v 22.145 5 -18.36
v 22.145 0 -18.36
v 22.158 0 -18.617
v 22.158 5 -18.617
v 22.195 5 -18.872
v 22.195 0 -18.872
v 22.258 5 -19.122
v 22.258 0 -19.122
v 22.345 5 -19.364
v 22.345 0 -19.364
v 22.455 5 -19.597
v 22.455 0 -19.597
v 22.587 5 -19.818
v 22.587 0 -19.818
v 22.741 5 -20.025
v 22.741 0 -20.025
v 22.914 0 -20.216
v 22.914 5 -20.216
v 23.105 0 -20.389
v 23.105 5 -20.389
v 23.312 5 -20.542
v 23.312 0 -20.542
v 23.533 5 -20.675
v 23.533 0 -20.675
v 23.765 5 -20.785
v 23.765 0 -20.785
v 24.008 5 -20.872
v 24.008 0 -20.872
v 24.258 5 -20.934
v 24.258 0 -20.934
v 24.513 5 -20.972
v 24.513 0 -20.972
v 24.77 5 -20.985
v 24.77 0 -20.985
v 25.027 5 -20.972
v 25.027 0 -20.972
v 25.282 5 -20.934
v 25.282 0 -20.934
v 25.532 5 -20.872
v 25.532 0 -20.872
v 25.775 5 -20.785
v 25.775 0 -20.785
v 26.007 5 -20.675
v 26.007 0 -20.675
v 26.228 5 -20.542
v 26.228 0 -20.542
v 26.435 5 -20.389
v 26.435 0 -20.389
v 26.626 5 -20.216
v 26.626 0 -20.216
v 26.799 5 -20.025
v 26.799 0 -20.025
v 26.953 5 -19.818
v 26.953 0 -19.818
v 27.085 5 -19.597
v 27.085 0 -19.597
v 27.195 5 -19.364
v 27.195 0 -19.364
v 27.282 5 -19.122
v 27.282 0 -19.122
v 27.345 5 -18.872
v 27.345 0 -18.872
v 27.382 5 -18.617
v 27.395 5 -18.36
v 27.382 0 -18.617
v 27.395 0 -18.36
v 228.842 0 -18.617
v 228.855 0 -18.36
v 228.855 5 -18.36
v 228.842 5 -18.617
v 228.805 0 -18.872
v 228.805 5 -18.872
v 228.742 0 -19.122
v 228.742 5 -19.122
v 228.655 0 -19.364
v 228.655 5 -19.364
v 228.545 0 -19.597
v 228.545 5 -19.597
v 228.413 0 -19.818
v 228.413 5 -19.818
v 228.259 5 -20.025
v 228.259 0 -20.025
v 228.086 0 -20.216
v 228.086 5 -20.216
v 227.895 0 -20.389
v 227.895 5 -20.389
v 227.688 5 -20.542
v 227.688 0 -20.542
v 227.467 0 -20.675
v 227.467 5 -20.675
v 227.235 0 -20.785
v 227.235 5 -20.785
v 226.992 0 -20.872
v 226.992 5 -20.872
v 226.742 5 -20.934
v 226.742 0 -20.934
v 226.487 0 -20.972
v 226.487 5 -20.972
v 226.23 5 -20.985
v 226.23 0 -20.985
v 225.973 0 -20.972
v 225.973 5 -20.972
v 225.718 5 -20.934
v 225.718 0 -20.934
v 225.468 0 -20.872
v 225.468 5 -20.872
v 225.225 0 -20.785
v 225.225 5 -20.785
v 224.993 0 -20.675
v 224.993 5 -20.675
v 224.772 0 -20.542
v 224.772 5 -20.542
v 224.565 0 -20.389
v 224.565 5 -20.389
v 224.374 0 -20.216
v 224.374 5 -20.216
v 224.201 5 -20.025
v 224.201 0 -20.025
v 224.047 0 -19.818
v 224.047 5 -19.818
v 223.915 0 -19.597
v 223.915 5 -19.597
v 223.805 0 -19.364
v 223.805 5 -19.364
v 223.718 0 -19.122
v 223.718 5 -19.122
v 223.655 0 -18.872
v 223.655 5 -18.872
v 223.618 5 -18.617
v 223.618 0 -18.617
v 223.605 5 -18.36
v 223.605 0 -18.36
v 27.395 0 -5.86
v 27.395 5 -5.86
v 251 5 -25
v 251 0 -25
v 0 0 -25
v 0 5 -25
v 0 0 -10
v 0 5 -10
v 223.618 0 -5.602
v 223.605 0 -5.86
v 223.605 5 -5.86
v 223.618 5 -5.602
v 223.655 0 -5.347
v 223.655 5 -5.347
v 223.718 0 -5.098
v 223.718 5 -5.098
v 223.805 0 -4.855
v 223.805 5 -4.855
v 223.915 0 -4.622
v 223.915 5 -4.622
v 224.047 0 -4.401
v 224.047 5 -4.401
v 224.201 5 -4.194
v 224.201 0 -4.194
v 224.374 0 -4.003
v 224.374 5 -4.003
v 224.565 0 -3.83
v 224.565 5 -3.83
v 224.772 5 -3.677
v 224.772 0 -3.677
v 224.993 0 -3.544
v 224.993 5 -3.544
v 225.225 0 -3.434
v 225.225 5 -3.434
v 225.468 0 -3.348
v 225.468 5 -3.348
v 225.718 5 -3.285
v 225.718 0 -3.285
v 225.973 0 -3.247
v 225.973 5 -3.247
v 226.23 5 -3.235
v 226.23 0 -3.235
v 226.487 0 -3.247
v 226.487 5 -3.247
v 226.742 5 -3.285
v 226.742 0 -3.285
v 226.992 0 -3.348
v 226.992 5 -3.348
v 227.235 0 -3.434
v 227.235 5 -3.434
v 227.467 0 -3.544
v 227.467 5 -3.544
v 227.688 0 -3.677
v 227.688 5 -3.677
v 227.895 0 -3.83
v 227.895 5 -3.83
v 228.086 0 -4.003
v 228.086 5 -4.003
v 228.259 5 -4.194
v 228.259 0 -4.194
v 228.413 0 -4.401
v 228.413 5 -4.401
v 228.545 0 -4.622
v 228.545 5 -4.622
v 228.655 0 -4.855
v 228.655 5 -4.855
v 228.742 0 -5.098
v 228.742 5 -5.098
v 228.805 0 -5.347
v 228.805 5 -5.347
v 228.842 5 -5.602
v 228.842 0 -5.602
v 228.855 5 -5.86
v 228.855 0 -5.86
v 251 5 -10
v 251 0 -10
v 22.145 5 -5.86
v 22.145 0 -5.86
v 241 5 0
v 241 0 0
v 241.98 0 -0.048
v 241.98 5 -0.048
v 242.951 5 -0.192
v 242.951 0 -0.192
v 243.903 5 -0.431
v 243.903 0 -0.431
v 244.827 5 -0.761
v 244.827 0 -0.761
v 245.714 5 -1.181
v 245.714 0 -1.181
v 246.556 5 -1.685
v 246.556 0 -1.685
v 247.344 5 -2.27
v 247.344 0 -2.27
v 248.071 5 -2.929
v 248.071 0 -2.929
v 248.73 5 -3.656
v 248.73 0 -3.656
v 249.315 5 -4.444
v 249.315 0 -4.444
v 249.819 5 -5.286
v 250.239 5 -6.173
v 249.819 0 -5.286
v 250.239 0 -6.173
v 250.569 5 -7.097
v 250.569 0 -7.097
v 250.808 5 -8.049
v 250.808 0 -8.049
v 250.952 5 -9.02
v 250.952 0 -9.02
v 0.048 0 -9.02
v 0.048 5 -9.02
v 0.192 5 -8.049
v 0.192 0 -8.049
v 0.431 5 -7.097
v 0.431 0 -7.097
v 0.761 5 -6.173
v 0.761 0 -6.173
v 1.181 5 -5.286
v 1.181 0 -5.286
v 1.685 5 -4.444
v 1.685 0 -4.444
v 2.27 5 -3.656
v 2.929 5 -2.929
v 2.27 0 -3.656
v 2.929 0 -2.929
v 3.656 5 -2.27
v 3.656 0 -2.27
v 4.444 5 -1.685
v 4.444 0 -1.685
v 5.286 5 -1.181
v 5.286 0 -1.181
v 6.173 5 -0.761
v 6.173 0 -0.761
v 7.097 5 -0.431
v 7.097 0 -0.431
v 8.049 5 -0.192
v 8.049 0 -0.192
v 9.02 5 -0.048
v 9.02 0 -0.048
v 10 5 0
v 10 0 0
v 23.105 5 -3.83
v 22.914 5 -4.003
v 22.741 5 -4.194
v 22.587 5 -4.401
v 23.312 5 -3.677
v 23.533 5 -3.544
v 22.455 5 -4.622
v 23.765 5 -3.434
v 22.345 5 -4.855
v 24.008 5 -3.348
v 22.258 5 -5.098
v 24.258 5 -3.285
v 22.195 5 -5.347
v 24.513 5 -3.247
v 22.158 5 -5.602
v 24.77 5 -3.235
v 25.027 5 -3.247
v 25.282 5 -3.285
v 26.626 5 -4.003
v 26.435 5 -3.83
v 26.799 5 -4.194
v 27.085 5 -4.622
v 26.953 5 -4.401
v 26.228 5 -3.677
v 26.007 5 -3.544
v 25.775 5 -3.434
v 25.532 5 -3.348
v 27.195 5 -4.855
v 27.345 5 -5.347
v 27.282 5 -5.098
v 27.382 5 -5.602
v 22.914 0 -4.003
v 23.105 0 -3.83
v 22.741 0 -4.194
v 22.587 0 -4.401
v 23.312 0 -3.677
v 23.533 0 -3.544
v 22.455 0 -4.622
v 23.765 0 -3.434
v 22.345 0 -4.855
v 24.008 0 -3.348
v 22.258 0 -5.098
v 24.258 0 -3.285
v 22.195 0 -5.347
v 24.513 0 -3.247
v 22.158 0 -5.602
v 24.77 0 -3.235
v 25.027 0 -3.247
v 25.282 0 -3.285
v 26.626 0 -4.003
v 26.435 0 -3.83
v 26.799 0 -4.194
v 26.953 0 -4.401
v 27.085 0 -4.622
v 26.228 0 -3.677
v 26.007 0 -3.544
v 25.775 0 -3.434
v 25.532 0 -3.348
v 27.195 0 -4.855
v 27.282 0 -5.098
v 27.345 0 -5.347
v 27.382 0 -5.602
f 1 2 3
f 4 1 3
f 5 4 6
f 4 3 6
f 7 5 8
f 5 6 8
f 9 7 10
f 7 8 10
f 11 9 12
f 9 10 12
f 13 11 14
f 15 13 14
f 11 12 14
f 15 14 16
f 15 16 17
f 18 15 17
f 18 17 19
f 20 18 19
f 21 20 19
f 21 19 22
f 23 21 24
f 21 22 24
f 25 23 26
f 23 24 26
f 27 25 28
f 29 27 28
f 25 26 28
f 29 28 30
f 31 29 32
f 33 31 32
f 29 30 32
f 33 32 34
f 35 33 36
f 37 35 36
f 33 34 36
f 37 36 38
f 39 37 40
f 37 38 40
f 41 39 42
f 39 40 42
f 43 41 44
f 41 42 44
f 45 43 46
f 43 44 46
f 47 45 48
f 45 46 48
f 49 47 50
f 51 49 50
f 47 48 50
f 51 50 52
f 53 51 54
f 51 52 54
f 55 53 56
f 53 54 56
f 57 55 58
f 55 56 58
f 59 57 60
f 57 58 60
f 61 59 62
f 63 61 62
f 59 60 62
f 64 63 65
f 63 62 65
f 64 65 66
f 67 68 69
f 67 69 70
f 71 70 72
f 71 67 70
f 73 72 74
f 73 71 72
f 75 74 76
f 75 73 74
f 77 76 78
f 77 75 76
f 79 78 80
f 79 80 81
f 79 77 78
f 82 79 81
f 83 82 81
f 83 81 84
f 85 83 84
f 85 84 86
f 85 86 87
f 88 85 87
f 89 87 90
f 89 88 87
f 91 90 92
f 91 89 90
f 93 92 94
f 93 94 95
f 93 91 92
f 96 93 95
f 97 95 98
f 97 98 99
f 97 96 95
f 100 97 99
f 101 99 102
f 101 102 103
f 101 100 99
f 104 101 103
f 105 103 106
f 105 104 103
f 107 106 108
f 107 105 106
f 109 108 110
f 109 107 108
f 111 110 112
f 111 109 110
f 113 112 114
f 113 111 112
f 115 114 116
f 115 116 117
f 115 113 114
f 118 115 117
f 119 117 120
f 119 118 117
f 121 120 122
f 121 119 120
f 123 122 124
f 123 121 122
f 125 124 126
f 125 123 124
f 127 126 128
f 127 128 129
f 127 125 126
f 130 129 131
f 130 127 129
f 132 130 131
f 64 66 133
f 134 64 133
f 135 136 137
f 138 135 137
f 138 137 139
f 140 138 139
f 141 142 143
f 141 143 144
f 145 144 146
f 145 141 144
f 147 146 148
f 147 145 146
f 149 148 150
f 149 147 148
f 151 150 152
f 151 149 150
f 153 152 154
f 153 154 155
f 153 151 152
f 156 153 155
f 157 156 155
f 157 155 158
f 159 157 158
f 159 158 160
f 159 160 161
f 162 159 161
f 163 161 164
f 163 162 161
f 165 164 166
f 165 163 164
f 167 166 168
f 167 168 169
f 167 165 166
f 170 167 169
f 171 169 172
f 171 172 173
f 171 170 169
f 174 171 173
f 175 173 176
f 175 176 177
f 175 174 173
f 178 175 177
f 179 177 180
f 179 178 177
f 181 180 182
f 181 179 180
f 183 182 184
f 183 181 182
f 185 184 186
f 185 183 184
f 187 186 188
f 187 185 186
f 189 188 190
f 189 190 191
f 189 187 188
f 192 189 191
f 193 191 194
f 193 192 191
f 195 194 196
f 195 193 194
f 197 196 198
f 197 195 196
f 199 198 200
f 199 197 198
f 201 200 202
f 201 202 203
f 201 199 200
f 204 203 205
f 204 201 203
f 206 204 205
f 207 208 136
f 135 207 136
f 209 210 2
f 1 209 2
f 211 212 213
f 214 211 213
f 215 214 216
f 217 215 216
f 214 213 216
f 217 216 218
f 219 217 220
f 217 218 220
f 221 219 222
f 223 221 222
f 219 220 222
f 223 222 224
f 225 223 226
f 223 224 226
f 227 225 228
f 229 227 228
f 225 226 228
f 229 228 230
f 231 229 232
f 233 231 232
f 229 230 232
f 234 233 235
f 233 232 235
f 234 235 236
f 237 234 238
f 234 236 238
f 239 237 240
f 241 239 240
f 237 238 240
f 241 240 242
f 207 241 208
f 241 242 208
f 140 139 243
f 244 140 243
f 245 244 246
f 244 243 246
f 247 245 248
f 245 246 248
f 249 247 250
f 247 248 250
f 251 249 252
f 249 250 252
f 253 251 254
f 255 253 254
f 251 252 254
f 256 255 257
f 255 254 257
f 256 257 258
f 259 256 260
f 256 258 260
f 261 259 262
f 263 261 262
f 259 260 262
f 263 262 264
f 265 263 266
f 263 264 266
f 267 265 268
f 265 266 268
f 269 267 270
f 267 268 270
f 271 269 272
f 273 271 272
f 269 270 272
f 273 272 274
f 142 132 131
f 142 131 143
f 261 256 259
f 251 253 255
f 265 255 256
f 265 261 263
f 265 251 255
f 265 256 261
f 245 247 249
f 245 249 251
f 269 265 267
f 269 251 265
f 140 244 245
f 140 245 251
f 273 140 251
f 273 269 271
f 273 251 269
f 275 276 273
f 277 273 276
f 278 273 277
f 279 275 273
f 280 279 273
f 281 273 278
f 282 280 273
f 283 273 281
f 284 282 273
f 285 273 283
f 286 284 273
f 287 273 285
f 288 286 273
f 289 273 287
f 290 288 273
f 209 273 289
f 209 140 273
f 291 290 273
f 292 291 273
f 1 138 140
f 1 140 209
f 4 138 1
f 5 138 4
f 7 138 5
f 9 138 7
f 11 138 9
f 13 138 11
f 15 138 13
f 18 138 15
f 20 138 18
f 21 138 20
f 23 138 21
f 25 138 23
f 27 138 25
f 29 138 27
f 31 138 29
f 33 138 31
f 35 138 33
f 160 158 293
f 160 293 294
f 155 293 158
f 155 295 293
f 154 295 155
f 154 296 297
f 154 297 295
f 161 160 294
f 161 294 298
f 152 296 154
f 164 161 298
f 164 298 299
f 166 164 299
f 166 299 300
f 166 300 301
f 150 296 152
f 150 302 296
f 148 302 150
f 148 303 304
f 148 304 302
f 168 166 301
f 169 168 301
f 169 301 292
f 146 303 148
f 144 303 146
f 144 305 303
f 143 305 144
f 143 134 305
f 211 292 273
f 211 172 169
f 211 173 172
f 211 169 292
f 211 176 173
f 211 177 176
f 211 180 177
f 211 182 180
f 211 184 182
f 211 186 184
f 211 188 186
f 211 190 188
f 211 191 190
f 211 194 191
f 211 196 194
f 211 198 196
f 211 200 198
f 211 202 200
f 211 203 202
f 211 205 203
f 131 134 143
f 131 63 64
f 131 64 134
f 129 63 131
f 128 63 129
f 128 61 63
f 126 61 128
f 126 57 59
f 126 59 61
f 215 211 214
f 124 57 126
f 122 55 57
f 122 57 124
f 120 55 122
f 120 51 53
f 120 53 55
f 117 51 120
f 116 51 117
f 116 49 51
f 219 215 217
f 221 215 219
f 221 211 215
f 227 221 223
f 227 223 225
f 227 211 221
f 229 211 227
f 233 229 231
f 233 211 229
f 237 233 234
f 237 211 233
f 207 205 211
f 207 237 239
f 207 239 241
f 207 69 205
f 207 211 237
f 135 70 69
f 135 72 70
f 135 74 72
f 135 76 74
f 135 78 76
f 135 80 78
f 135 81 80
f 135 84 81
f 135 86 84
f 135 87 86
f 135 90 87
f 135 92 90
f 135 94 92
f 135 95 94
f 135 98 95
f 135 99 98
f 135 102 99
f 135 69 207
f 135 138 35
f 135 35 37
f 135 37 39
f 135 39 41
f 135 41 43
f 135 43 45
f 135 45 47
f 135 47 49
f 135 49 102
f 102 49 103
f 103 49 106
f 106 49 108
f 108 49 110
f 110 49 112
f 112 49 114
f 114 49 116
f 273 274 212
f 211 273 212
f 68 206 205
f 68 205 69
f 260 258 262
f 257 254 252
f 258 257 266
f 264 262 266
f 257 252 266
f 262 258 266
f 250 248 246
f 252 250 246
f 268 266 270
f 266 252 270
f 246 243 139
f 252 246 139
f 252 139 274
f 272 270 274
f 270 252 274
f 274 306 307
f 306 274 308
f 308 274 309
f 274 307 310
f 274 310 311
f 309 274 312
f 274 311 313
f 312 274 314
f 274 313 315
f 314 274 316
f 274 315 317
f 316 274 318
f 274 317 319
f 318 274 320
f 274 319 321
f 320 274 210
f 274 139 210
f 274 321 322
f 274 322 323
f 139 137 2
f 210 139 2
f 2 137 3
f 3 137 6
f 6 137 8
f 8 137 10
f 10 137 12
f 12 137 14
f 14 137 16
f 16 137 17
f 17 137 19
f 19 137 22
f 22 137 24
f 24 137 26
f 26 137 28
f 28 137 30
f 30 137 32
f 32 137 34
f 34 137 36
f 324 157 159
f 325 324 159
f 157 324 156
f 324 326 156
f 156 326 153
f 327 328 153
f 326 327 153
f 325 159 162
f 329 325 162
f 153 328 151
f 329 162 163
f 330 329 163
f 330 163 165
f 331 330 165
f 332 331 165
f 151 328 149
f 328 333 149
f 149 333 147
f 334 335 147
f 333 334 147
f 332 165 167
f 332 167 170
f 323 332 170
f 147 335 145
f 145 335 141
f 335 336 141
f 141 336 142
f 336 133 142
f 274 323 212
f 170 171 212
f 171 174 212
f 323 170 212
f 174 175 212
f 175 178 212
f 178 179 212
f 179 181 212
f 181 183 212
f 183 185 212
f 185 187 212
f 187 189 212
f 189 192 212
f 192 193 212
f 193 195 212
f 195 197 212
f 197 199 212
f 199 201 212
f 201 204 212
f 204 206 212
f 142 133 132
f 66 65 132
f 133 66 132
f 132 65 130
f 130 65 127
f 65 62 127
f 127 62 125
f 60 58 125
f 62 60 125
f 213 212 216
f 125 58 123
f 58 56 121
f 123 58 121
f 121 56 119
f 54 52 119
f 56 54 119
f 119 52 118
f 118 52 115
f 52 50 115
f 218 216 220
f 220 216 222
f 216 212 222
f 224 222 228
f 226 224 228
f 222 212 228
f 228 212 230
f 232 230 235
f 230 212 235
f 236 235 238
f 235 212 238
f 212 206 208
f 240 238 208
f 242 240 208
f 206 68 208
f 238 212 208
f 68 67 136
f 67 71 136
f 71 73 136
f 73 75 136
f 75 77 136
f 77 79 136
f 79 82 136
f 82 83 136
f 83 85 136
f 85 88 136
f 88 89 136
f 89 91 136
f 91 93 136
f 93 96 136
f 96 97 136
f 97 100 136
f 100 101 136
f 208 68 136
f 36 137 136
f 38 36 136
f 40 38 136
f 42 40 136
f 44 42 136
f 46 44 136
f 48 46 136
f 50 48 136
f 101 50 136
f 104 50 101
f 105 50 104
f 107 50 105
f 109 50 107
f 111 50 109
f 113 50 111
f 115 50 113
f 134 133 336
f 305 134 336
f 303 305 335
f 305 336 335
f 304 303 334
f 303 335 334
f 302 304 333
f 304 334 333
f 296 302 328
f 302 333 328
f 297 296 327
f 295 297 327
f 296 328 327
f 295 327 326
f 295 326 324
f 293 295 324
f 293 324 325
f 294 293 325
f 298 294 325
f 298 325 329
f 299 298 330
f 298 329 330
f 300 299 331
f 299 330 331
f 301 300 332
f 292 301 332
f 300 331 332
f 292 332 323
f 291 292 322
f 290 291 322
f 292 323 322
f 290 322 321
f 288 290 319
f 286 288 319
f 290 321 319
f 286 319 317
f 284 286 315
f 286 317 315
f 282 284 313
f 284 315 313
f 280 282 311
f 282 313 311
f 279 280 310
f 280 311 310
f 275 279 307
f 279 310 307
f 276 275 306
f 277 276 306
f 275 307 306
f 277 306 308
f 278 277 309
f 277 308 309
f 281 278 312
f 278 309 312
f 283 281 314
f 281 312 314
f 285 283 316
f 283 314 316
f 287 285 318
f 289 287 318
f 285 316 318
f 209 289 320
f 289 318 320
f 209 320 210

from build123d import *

# Parameters (mm, degrees)
SALIENTE_EXTRUIR1_DEPTH = 5


with BuildPart() as part:
    # Croquis1 → Saliente-Extruir1 (new body)
    with BuildSketch(Plane(origin=(0, 0, 0), x_dir=(1, 0, 0), z_dir=(0, 1, 0))):
        with BuildLine():
            Line((10, 0), (241, 0))
            ThreePointArc((241, 0), (248.071067812, 2.928932188), (251, 10))
            Line((251, 10), (251, 25))
            Line((251, 25), (0, 25))
            Line((0, 25), (0, 10))
            ThreePointArc((0, 10), (2.928932188, 2.928932188), (10, 0))
        make_face()
        with BuildLine():
            Line((27.395, 18.359540636), (27.395, 5.859540636))
            ThreePointArc((27.395, 5.859540636), (24.77, 3.234540636), (22.145, 5.859540636))
            Line((22.145, 5.859540636), (22.145, 18.359540636))
            ThreePointArc((22.145, 18.359540636), (24.77, 20.984540636), (27.395, 18.359540636))
        make_face(mode=Mode.SUBTRACT)
        with BuildLine():
            Line((223.605, 18.359540636), (223.605, 5.859540636))
            ThreePointArc((223.605, 5.859540636), (226.23, 3.234540636), (228.855, 5.859540636))
            Line((228.855, 5.859540636), (228.855, 18.359540636))
            ThreePointArc((228.855, 18.359540636), (226.23, 20.984540636), (223.605, 18.359540636))
        make_face(mode=Mode.SUBTRACT)
    extrude(amount=SALIENTE_EXTRUIR1_DEPTH)


solid = part.part
